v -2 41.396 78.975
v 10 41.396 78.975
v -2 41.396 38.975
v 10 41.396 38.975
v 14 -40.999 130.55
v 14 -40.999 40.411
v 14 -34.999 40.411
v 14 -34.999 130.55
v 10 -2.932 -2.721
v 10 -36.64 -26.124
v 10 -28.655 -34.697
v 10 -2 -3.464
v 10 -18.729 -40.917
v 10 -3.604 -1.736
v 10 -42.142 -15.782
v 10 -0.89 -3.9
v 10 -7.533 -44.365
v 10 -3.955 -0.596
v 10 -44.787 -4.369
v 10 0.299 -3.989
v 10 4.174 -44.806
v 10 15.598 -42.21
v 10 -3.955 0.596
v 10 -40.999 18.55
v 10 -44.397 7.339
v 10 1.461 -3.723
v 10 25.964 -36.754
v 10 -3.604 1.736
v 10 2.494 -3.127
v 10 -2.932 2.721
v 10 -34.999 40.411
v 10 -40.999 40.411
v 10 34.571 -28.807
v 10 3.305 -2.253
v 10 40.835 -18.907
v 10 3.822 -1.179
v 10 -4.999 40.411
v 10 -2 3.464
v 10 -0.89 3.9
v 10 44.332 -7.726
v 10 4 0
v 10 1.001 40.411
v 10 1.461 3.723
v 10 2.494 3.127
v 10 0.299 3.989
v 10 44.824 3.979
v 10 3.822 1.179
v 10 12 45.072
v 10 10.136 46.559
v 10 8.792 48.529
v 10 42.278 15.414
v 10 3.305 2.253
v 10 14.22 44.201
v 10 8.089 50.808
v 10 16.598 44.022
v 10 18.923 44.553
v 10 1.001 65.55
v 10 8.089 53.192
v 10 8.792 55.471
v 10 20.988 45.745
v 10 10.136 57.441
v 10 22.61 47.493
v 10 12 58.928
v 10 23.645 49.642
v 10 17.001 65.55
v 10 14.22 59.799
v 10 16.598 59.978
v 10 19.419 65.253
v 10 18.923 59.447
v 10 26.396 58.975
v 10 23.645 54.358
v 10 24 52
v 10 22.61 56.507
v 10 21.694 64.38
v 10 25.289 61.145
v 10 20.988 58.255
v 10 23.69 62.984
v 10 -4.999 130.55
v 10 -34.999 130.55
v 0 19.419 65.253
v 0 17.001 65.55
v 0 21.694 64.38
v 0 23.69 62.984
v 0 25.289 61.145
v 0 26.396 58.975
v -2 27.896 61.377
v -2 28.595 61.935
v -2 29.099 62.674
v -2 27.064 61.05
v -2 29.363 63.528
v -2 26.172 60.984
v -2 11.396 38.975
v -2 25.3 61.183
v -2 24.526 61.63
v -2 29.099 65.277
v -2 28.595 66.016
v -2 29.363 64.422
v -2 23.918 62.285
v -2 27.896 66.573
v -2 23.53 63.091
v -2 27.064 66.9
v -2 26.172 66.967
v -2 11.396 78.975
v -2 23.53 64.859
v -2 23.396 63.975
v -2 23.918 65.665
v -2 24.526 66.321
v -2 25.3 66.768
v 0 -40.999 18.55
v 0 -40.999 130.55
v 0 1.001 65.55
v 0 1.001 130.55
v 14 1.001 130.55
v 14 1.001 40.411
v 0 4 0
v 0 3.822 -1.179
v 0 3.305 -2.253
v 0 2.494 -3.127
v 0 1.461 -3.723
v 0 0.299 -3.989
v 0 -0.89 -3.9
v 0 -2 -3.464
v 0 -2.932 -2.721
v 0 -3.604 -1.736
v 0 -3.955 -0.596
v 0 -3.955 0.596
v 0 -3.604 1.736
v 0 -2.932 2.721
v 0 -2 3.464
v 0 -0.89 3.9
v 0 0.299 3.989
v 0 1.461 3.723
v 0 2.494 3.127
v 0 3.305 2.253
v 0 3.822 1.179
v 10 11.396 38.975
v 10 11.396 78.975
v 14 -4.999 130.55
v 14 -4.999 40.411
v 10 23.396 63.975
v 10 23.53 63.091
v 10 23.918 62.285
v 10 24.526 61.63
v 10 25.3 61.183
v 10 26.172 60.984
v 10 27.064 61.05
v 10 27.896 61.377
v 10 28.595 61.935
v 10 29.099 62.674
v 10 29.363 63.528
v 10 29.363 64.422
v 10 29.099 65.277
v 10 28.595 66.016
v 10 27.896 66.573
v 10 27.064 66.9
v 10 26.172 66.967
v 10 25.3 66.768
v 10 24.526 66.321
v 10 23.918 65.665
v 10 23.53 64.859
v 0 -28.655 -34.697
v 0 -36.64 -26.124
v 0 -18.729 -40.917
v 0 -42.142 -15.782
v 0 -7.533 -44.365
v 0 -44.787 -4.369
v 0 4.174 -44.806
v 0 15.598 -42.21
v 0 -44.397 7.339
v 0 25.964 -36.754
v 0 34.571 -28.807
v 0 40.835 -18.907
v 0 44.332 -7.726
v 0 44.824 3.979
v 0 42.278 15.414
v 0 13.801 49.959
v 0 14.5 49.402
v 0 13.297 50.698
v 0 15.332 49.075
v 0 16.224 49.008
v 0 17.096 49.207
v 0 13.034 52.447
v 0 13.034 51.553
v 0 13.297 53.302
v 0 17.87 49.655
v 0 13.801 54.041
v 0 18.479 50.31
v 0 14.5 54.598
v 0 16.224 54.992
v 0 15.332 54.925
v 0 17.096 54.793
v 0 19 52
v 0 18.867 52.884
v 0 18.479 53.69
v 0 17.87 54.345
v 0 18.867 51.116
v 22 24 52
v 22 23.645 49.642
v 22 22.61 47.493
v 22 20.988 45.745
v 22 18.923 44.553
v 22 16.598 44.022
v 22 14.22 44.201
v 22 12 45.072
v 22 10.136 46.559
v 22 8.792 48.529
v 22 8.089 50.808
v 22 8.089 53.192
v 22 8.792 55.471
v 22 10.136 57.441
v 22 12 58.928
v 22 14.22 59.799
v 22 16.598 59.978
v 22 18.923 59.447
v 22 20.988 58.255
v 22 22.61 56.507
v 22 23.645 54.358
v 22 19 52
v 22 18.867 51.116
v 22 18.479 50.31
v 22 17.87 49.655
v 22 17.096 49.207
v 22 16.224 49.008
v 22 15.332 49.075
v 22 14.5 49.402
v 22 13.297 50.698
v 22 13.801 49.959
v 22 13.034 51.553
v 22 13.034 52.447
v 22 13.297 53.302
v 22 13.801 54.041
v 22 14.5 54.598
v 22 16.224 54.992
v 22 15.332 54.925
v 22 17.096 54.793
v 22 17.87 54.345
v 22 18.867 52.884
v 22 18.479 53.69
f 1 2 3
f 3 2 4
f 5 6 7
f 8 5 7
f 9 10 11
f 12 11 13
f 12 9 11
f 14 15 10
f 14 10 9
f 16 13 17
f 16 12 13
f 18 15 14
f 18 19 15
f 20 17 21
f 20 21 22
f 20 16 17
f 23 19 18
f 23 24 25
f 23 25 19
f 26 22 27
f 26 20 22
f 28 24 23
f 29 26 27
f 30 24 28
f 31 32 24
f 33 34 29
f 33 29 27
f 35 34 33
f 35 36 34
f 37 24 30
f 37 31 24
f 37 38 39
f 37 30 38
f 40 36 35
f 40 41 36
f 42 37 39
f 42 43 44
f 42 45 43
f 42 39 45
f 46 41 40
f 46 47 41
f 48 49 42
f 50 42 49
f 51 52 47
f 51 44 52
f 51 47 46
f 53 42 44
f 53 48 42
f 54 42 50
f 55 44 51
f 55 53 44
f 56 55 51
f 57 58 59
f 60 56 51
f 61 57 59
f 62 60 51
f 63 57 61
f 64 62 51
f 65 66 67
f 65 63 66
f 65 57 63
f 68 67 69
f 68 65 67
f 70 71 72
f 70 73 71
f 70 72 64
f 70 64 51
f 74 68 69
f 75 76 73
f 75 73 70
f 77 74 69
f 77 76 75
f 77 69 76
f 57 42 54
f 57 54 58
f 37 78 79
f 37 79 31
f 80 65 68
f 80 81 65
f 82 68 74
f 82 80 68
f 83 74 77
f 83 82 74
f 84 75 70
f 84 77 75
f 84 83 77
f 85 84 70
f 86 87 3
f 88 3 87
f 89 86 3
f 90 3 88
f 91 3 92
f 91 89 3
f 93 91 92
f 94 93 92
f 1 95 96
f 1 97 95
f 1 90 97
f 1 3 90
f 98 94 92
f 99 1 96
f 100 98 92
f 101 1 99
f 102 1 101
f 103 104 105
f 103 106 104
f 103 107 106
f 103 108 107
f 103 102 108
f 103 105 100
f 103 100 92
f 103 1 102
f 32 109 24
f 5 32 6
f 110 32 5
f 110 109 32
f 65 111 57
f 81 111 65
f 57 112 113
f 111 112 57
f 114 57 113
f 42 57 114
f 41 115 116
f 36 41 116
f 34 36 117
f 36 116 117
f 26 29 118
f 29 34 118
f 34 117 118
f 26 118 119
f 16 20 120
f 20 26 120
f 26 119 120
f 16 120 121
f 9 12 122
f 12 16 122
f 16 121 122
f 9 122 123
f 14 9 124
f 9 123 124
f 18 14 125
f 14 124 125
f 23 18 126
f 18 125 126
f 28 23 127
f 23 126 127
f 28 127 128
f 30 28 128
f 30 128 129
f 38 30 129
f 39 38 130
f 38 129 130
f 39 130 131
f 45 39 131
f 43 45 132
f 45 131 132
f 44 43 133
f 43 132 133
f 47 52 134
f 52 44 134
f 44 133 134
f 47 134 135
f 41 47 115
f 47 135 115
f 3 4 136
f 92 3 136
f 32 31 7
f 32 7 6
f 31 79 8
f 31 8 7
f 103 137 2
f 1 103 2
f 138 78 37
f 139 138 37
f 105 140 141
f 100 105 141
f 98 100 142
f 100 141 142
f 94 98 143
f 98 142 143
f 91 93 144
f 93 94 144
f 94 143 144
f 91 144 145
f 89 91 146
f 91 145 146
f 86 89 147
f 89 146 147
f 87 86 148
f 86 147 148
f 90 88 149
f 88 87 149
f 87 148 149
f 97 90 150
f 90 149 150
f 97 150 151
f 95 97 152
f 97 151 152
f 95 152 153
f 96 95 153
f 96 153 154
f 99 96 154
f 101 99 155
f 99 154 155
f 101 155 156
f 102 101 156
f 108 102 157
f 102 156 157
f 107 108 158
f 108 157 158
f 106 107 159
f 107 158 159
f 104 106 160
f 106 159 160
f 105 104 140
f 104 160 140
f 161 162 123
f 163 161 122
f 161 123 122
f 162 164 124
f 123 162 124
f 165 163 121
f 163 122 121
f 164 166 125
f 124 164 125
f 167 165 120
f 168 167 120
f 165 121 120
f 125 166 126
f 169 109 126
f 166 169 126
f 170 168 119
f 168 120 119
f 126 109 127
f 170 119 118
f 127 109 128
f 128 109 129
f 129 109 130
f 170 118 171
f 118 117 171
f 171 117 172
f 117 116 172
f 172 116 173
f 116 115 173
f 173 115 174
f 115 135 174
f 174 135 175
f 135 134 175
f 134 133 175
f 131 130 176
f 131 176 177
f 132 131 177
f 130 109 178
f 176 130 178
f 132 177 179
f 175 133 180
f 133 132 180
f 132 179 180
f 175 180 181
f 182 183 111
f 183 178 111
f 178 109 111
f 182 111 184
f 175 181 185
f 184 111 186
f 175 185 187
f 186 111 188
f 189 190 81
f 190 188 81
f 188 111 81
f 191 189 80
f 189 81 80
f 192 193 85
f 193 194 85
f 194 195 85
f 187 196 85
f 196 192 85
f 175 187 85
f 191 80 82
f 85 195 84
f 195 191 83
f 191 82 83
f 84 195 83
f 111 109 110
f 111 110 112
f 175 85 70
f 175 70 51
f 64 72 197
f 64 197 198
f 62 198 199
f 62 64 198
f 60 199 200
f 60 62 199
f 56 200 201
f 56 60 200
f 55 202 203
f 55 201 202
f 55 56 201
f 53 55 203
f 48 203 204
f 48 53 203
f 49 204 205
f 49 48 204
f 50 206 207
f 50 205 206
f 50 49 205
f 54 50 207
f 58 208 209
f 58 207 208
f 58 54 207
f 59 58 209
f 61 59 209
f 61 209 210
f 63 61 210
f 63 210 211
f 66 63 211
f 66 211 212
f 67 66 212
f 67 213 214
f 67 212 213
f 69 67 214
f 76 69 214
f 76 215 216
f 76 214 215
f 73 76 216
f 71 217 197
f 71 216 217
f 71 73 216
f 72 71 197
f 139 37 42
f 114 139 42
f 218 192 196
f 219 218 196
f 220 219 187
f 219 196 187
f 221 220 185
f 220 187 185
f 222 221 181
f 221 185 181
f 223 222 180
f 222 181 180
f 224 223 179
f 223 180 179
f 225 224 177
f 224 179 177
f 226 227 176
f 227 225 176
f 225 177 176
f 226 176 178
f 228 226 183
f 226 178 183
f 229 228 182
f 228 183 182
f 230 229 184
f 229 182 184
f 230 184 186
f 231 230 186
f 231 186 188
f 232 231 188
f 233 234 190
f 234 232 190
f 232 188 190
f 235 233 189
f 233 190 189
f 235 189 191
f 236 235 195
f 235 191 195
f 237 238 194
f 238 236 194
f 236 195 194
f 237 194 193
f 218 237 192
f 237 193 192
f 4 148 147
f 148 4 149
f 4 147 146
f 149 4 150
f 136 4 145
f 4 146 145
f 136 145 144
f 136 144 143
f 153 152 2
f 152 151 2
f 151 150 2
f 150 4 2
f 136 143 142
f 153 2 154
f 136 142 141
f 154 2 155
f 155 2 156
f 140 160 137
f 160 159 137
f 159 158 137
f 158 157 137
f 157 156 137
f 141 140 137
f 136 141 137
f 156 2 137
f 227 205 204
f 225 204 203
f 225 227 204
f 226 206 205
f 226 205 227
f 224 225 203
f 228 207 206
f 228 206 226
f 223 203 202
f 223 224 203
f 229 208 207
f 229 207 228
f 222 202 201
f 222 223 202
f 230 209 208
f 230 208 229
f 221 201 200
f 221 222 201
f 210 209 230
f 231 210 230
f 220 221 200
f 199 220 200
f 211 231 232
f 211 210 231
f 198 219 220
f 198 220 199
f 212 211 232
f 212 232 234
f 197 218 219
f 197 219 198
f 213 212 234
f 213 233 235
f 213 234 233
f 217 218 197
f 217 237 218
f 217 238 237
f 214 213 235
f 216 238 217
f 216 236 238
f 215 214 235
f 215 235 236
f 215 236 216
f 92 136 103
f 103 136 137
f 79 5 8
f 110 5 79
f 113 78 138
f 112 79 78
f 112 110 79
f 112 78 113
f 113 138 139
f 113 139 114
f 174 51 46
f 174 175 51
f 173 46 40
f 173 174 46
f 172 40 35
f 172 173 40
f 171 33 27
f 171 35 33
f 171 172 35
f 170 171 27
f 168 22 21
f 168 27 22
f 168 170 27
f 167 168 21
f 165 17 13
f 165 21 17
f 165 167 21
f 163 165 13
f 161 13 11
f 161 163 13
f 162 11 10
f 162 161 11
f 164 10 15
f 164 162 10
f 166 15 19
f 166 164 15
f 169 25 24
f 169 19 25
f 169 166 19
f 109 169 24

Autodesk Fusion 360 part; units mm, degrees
sketch "Sketch1" plane through (0, 0, 0) normal (1, 0, 0) x (0, 1, 0) in component "c1"
  circle A0 centre (0, 0) radius 4
  line L0 (-40.9987, 18.55) -> (-40.9987, 130.55)
  line L1 (-40.9987, 130.55) -> (1.0013, 130.55)
  line L2 (1.0013, 130.55) -> (1.0013, 65.55)
  line L3 (1.0013, 65.55) -> (17.0013, 65.55)
  arc A1 (26.8331, 53.724) -> (17.0013, 65.55) centre (17.0013, 55.55) ccw
  line L4 (26.3963, 58.9752) -> (42.2779, 15.4135)
  circle A2 centre (16, 52) radius 8
  circle A3 centre (16, 52) radius 3
  arc A4 (-40.9987, 18.55) -> (42.2779, 15.4135) centre (0, 0) ccw
  dimension "d1" = 90
  dimension "d2" = 8
  dimension "d3" = 112
  dimension "d4" = 18.55
  dimension "d5" = 42
  dimension "d6" = 65
  dimension "d7" = 16
  dimension "d9" = 10
  dimension "d10" = 16
  dimension "d11" = 6
  dimension "d12" = 52
  dimension "d13" = 16
extrude "Extrude1" add sketch "Sketch1" along normal blind 10 contours L0 L1 L2 L3 A1 L4 A4 makes body 1 in component "c1"
extrude "Extrude2" add sketch "Sketch1" along normal blind 22 contours A2 bodies 1 in component "c1"
sketch "Sketch2" plane through (10, 0, 0) normal (1, 0, 0) x (0, 1, 0) in component "c1"
  circle A0 centre (16, 52) radius 8
  circle A1 centre (0, 0) radius 4
  line L0 (-40.9987, 130.55) -> (-40.9987, 18.55)
  arc A2 (-40.9987, 18.55) -> (42.2779, 15.4135) centre (0, 0) ccw
  line L1 (42.2779, 15.4135) -> (26.3963, 58.9752)
  arc A3 (26.3963, 58.9752) -> (17.0013, 65.55) centre (17.0013, 55.55) ccw
  line L2 (17.0013, 65.55) -> (1.0013, 65.55)
  line L3 (1.0013, 65.55) -> (1.0013, 130.55)
  line L4 (1.0013, 130.55) -> (-40.9987, 130.55)
  line L5 (-40.9987, 130.55) -> (-34.9987, 130.55)
  line L6 (-34.9987, 130.55) -> (-34.9987, 40.4114)
  line L7 (-34.9987, 40.4114) -> (-40.9987, 40.4114)
  line L8 (-40.9987, 40.4114) -> (-40.9987, 130.55)
  line L9 (1.0013, 130.55) -> (-4.9987, 130.55)
  line L10 (-4.9987, 130.55) -> (-4.9987, 40.4114)
  line L11 (-4.9987, 40.4114) -> (1.0013, 40.4114)
  line L12 (1.0013, 40.4114) -> (1.0013, 130.55)
  dimension "d18" = 6
  dimension "d19" = 6
extrude "Extrude3" add sketch "Sketch2" along normal blind 4 contours L0 L4 L5 L6 L7 L8 | L3 L4 L9 L10 L11 L12 bodies 1 in component "c1"
sketch "Sketch1 (2)" plane through (0, 0, 0) normal (1, 0, 0) x (0, 1, 0) in component "c2"
  line L0 (0, 0) -> (30, 0)
  line L1 (30, 0) -> (30, 40)
  line L2 (30, 40) -> (0, 40)
  line L3 (0, 40) -> (0, 0)
  circle A0 centre (15, 25) radius 3
  dimension "d31" = 30
  dimension "d32" = 40
  dimension "d33" = 6
  dimension "d34" = 15
  dimension "d35" = 25
extrude "Extrude1'" add sketch "Sketch1 (2)" along normal blind 12 separate body makes body 2 in component "c2"
sketch "Sketch2 (2)" plane through (0, 0, 0) normal (1, 0, 0) x (0, 1, 0) in component "c2"
component "c1" placed x (1, 0, 0) y (0, 1, 0) z (0, 0, 1) at (0, 0, 0)
component "c2" placed x (-1, 0, 0) y (0, -1, 0) z (0, 0, 1) at (10, 41.3963, 38.9752)
